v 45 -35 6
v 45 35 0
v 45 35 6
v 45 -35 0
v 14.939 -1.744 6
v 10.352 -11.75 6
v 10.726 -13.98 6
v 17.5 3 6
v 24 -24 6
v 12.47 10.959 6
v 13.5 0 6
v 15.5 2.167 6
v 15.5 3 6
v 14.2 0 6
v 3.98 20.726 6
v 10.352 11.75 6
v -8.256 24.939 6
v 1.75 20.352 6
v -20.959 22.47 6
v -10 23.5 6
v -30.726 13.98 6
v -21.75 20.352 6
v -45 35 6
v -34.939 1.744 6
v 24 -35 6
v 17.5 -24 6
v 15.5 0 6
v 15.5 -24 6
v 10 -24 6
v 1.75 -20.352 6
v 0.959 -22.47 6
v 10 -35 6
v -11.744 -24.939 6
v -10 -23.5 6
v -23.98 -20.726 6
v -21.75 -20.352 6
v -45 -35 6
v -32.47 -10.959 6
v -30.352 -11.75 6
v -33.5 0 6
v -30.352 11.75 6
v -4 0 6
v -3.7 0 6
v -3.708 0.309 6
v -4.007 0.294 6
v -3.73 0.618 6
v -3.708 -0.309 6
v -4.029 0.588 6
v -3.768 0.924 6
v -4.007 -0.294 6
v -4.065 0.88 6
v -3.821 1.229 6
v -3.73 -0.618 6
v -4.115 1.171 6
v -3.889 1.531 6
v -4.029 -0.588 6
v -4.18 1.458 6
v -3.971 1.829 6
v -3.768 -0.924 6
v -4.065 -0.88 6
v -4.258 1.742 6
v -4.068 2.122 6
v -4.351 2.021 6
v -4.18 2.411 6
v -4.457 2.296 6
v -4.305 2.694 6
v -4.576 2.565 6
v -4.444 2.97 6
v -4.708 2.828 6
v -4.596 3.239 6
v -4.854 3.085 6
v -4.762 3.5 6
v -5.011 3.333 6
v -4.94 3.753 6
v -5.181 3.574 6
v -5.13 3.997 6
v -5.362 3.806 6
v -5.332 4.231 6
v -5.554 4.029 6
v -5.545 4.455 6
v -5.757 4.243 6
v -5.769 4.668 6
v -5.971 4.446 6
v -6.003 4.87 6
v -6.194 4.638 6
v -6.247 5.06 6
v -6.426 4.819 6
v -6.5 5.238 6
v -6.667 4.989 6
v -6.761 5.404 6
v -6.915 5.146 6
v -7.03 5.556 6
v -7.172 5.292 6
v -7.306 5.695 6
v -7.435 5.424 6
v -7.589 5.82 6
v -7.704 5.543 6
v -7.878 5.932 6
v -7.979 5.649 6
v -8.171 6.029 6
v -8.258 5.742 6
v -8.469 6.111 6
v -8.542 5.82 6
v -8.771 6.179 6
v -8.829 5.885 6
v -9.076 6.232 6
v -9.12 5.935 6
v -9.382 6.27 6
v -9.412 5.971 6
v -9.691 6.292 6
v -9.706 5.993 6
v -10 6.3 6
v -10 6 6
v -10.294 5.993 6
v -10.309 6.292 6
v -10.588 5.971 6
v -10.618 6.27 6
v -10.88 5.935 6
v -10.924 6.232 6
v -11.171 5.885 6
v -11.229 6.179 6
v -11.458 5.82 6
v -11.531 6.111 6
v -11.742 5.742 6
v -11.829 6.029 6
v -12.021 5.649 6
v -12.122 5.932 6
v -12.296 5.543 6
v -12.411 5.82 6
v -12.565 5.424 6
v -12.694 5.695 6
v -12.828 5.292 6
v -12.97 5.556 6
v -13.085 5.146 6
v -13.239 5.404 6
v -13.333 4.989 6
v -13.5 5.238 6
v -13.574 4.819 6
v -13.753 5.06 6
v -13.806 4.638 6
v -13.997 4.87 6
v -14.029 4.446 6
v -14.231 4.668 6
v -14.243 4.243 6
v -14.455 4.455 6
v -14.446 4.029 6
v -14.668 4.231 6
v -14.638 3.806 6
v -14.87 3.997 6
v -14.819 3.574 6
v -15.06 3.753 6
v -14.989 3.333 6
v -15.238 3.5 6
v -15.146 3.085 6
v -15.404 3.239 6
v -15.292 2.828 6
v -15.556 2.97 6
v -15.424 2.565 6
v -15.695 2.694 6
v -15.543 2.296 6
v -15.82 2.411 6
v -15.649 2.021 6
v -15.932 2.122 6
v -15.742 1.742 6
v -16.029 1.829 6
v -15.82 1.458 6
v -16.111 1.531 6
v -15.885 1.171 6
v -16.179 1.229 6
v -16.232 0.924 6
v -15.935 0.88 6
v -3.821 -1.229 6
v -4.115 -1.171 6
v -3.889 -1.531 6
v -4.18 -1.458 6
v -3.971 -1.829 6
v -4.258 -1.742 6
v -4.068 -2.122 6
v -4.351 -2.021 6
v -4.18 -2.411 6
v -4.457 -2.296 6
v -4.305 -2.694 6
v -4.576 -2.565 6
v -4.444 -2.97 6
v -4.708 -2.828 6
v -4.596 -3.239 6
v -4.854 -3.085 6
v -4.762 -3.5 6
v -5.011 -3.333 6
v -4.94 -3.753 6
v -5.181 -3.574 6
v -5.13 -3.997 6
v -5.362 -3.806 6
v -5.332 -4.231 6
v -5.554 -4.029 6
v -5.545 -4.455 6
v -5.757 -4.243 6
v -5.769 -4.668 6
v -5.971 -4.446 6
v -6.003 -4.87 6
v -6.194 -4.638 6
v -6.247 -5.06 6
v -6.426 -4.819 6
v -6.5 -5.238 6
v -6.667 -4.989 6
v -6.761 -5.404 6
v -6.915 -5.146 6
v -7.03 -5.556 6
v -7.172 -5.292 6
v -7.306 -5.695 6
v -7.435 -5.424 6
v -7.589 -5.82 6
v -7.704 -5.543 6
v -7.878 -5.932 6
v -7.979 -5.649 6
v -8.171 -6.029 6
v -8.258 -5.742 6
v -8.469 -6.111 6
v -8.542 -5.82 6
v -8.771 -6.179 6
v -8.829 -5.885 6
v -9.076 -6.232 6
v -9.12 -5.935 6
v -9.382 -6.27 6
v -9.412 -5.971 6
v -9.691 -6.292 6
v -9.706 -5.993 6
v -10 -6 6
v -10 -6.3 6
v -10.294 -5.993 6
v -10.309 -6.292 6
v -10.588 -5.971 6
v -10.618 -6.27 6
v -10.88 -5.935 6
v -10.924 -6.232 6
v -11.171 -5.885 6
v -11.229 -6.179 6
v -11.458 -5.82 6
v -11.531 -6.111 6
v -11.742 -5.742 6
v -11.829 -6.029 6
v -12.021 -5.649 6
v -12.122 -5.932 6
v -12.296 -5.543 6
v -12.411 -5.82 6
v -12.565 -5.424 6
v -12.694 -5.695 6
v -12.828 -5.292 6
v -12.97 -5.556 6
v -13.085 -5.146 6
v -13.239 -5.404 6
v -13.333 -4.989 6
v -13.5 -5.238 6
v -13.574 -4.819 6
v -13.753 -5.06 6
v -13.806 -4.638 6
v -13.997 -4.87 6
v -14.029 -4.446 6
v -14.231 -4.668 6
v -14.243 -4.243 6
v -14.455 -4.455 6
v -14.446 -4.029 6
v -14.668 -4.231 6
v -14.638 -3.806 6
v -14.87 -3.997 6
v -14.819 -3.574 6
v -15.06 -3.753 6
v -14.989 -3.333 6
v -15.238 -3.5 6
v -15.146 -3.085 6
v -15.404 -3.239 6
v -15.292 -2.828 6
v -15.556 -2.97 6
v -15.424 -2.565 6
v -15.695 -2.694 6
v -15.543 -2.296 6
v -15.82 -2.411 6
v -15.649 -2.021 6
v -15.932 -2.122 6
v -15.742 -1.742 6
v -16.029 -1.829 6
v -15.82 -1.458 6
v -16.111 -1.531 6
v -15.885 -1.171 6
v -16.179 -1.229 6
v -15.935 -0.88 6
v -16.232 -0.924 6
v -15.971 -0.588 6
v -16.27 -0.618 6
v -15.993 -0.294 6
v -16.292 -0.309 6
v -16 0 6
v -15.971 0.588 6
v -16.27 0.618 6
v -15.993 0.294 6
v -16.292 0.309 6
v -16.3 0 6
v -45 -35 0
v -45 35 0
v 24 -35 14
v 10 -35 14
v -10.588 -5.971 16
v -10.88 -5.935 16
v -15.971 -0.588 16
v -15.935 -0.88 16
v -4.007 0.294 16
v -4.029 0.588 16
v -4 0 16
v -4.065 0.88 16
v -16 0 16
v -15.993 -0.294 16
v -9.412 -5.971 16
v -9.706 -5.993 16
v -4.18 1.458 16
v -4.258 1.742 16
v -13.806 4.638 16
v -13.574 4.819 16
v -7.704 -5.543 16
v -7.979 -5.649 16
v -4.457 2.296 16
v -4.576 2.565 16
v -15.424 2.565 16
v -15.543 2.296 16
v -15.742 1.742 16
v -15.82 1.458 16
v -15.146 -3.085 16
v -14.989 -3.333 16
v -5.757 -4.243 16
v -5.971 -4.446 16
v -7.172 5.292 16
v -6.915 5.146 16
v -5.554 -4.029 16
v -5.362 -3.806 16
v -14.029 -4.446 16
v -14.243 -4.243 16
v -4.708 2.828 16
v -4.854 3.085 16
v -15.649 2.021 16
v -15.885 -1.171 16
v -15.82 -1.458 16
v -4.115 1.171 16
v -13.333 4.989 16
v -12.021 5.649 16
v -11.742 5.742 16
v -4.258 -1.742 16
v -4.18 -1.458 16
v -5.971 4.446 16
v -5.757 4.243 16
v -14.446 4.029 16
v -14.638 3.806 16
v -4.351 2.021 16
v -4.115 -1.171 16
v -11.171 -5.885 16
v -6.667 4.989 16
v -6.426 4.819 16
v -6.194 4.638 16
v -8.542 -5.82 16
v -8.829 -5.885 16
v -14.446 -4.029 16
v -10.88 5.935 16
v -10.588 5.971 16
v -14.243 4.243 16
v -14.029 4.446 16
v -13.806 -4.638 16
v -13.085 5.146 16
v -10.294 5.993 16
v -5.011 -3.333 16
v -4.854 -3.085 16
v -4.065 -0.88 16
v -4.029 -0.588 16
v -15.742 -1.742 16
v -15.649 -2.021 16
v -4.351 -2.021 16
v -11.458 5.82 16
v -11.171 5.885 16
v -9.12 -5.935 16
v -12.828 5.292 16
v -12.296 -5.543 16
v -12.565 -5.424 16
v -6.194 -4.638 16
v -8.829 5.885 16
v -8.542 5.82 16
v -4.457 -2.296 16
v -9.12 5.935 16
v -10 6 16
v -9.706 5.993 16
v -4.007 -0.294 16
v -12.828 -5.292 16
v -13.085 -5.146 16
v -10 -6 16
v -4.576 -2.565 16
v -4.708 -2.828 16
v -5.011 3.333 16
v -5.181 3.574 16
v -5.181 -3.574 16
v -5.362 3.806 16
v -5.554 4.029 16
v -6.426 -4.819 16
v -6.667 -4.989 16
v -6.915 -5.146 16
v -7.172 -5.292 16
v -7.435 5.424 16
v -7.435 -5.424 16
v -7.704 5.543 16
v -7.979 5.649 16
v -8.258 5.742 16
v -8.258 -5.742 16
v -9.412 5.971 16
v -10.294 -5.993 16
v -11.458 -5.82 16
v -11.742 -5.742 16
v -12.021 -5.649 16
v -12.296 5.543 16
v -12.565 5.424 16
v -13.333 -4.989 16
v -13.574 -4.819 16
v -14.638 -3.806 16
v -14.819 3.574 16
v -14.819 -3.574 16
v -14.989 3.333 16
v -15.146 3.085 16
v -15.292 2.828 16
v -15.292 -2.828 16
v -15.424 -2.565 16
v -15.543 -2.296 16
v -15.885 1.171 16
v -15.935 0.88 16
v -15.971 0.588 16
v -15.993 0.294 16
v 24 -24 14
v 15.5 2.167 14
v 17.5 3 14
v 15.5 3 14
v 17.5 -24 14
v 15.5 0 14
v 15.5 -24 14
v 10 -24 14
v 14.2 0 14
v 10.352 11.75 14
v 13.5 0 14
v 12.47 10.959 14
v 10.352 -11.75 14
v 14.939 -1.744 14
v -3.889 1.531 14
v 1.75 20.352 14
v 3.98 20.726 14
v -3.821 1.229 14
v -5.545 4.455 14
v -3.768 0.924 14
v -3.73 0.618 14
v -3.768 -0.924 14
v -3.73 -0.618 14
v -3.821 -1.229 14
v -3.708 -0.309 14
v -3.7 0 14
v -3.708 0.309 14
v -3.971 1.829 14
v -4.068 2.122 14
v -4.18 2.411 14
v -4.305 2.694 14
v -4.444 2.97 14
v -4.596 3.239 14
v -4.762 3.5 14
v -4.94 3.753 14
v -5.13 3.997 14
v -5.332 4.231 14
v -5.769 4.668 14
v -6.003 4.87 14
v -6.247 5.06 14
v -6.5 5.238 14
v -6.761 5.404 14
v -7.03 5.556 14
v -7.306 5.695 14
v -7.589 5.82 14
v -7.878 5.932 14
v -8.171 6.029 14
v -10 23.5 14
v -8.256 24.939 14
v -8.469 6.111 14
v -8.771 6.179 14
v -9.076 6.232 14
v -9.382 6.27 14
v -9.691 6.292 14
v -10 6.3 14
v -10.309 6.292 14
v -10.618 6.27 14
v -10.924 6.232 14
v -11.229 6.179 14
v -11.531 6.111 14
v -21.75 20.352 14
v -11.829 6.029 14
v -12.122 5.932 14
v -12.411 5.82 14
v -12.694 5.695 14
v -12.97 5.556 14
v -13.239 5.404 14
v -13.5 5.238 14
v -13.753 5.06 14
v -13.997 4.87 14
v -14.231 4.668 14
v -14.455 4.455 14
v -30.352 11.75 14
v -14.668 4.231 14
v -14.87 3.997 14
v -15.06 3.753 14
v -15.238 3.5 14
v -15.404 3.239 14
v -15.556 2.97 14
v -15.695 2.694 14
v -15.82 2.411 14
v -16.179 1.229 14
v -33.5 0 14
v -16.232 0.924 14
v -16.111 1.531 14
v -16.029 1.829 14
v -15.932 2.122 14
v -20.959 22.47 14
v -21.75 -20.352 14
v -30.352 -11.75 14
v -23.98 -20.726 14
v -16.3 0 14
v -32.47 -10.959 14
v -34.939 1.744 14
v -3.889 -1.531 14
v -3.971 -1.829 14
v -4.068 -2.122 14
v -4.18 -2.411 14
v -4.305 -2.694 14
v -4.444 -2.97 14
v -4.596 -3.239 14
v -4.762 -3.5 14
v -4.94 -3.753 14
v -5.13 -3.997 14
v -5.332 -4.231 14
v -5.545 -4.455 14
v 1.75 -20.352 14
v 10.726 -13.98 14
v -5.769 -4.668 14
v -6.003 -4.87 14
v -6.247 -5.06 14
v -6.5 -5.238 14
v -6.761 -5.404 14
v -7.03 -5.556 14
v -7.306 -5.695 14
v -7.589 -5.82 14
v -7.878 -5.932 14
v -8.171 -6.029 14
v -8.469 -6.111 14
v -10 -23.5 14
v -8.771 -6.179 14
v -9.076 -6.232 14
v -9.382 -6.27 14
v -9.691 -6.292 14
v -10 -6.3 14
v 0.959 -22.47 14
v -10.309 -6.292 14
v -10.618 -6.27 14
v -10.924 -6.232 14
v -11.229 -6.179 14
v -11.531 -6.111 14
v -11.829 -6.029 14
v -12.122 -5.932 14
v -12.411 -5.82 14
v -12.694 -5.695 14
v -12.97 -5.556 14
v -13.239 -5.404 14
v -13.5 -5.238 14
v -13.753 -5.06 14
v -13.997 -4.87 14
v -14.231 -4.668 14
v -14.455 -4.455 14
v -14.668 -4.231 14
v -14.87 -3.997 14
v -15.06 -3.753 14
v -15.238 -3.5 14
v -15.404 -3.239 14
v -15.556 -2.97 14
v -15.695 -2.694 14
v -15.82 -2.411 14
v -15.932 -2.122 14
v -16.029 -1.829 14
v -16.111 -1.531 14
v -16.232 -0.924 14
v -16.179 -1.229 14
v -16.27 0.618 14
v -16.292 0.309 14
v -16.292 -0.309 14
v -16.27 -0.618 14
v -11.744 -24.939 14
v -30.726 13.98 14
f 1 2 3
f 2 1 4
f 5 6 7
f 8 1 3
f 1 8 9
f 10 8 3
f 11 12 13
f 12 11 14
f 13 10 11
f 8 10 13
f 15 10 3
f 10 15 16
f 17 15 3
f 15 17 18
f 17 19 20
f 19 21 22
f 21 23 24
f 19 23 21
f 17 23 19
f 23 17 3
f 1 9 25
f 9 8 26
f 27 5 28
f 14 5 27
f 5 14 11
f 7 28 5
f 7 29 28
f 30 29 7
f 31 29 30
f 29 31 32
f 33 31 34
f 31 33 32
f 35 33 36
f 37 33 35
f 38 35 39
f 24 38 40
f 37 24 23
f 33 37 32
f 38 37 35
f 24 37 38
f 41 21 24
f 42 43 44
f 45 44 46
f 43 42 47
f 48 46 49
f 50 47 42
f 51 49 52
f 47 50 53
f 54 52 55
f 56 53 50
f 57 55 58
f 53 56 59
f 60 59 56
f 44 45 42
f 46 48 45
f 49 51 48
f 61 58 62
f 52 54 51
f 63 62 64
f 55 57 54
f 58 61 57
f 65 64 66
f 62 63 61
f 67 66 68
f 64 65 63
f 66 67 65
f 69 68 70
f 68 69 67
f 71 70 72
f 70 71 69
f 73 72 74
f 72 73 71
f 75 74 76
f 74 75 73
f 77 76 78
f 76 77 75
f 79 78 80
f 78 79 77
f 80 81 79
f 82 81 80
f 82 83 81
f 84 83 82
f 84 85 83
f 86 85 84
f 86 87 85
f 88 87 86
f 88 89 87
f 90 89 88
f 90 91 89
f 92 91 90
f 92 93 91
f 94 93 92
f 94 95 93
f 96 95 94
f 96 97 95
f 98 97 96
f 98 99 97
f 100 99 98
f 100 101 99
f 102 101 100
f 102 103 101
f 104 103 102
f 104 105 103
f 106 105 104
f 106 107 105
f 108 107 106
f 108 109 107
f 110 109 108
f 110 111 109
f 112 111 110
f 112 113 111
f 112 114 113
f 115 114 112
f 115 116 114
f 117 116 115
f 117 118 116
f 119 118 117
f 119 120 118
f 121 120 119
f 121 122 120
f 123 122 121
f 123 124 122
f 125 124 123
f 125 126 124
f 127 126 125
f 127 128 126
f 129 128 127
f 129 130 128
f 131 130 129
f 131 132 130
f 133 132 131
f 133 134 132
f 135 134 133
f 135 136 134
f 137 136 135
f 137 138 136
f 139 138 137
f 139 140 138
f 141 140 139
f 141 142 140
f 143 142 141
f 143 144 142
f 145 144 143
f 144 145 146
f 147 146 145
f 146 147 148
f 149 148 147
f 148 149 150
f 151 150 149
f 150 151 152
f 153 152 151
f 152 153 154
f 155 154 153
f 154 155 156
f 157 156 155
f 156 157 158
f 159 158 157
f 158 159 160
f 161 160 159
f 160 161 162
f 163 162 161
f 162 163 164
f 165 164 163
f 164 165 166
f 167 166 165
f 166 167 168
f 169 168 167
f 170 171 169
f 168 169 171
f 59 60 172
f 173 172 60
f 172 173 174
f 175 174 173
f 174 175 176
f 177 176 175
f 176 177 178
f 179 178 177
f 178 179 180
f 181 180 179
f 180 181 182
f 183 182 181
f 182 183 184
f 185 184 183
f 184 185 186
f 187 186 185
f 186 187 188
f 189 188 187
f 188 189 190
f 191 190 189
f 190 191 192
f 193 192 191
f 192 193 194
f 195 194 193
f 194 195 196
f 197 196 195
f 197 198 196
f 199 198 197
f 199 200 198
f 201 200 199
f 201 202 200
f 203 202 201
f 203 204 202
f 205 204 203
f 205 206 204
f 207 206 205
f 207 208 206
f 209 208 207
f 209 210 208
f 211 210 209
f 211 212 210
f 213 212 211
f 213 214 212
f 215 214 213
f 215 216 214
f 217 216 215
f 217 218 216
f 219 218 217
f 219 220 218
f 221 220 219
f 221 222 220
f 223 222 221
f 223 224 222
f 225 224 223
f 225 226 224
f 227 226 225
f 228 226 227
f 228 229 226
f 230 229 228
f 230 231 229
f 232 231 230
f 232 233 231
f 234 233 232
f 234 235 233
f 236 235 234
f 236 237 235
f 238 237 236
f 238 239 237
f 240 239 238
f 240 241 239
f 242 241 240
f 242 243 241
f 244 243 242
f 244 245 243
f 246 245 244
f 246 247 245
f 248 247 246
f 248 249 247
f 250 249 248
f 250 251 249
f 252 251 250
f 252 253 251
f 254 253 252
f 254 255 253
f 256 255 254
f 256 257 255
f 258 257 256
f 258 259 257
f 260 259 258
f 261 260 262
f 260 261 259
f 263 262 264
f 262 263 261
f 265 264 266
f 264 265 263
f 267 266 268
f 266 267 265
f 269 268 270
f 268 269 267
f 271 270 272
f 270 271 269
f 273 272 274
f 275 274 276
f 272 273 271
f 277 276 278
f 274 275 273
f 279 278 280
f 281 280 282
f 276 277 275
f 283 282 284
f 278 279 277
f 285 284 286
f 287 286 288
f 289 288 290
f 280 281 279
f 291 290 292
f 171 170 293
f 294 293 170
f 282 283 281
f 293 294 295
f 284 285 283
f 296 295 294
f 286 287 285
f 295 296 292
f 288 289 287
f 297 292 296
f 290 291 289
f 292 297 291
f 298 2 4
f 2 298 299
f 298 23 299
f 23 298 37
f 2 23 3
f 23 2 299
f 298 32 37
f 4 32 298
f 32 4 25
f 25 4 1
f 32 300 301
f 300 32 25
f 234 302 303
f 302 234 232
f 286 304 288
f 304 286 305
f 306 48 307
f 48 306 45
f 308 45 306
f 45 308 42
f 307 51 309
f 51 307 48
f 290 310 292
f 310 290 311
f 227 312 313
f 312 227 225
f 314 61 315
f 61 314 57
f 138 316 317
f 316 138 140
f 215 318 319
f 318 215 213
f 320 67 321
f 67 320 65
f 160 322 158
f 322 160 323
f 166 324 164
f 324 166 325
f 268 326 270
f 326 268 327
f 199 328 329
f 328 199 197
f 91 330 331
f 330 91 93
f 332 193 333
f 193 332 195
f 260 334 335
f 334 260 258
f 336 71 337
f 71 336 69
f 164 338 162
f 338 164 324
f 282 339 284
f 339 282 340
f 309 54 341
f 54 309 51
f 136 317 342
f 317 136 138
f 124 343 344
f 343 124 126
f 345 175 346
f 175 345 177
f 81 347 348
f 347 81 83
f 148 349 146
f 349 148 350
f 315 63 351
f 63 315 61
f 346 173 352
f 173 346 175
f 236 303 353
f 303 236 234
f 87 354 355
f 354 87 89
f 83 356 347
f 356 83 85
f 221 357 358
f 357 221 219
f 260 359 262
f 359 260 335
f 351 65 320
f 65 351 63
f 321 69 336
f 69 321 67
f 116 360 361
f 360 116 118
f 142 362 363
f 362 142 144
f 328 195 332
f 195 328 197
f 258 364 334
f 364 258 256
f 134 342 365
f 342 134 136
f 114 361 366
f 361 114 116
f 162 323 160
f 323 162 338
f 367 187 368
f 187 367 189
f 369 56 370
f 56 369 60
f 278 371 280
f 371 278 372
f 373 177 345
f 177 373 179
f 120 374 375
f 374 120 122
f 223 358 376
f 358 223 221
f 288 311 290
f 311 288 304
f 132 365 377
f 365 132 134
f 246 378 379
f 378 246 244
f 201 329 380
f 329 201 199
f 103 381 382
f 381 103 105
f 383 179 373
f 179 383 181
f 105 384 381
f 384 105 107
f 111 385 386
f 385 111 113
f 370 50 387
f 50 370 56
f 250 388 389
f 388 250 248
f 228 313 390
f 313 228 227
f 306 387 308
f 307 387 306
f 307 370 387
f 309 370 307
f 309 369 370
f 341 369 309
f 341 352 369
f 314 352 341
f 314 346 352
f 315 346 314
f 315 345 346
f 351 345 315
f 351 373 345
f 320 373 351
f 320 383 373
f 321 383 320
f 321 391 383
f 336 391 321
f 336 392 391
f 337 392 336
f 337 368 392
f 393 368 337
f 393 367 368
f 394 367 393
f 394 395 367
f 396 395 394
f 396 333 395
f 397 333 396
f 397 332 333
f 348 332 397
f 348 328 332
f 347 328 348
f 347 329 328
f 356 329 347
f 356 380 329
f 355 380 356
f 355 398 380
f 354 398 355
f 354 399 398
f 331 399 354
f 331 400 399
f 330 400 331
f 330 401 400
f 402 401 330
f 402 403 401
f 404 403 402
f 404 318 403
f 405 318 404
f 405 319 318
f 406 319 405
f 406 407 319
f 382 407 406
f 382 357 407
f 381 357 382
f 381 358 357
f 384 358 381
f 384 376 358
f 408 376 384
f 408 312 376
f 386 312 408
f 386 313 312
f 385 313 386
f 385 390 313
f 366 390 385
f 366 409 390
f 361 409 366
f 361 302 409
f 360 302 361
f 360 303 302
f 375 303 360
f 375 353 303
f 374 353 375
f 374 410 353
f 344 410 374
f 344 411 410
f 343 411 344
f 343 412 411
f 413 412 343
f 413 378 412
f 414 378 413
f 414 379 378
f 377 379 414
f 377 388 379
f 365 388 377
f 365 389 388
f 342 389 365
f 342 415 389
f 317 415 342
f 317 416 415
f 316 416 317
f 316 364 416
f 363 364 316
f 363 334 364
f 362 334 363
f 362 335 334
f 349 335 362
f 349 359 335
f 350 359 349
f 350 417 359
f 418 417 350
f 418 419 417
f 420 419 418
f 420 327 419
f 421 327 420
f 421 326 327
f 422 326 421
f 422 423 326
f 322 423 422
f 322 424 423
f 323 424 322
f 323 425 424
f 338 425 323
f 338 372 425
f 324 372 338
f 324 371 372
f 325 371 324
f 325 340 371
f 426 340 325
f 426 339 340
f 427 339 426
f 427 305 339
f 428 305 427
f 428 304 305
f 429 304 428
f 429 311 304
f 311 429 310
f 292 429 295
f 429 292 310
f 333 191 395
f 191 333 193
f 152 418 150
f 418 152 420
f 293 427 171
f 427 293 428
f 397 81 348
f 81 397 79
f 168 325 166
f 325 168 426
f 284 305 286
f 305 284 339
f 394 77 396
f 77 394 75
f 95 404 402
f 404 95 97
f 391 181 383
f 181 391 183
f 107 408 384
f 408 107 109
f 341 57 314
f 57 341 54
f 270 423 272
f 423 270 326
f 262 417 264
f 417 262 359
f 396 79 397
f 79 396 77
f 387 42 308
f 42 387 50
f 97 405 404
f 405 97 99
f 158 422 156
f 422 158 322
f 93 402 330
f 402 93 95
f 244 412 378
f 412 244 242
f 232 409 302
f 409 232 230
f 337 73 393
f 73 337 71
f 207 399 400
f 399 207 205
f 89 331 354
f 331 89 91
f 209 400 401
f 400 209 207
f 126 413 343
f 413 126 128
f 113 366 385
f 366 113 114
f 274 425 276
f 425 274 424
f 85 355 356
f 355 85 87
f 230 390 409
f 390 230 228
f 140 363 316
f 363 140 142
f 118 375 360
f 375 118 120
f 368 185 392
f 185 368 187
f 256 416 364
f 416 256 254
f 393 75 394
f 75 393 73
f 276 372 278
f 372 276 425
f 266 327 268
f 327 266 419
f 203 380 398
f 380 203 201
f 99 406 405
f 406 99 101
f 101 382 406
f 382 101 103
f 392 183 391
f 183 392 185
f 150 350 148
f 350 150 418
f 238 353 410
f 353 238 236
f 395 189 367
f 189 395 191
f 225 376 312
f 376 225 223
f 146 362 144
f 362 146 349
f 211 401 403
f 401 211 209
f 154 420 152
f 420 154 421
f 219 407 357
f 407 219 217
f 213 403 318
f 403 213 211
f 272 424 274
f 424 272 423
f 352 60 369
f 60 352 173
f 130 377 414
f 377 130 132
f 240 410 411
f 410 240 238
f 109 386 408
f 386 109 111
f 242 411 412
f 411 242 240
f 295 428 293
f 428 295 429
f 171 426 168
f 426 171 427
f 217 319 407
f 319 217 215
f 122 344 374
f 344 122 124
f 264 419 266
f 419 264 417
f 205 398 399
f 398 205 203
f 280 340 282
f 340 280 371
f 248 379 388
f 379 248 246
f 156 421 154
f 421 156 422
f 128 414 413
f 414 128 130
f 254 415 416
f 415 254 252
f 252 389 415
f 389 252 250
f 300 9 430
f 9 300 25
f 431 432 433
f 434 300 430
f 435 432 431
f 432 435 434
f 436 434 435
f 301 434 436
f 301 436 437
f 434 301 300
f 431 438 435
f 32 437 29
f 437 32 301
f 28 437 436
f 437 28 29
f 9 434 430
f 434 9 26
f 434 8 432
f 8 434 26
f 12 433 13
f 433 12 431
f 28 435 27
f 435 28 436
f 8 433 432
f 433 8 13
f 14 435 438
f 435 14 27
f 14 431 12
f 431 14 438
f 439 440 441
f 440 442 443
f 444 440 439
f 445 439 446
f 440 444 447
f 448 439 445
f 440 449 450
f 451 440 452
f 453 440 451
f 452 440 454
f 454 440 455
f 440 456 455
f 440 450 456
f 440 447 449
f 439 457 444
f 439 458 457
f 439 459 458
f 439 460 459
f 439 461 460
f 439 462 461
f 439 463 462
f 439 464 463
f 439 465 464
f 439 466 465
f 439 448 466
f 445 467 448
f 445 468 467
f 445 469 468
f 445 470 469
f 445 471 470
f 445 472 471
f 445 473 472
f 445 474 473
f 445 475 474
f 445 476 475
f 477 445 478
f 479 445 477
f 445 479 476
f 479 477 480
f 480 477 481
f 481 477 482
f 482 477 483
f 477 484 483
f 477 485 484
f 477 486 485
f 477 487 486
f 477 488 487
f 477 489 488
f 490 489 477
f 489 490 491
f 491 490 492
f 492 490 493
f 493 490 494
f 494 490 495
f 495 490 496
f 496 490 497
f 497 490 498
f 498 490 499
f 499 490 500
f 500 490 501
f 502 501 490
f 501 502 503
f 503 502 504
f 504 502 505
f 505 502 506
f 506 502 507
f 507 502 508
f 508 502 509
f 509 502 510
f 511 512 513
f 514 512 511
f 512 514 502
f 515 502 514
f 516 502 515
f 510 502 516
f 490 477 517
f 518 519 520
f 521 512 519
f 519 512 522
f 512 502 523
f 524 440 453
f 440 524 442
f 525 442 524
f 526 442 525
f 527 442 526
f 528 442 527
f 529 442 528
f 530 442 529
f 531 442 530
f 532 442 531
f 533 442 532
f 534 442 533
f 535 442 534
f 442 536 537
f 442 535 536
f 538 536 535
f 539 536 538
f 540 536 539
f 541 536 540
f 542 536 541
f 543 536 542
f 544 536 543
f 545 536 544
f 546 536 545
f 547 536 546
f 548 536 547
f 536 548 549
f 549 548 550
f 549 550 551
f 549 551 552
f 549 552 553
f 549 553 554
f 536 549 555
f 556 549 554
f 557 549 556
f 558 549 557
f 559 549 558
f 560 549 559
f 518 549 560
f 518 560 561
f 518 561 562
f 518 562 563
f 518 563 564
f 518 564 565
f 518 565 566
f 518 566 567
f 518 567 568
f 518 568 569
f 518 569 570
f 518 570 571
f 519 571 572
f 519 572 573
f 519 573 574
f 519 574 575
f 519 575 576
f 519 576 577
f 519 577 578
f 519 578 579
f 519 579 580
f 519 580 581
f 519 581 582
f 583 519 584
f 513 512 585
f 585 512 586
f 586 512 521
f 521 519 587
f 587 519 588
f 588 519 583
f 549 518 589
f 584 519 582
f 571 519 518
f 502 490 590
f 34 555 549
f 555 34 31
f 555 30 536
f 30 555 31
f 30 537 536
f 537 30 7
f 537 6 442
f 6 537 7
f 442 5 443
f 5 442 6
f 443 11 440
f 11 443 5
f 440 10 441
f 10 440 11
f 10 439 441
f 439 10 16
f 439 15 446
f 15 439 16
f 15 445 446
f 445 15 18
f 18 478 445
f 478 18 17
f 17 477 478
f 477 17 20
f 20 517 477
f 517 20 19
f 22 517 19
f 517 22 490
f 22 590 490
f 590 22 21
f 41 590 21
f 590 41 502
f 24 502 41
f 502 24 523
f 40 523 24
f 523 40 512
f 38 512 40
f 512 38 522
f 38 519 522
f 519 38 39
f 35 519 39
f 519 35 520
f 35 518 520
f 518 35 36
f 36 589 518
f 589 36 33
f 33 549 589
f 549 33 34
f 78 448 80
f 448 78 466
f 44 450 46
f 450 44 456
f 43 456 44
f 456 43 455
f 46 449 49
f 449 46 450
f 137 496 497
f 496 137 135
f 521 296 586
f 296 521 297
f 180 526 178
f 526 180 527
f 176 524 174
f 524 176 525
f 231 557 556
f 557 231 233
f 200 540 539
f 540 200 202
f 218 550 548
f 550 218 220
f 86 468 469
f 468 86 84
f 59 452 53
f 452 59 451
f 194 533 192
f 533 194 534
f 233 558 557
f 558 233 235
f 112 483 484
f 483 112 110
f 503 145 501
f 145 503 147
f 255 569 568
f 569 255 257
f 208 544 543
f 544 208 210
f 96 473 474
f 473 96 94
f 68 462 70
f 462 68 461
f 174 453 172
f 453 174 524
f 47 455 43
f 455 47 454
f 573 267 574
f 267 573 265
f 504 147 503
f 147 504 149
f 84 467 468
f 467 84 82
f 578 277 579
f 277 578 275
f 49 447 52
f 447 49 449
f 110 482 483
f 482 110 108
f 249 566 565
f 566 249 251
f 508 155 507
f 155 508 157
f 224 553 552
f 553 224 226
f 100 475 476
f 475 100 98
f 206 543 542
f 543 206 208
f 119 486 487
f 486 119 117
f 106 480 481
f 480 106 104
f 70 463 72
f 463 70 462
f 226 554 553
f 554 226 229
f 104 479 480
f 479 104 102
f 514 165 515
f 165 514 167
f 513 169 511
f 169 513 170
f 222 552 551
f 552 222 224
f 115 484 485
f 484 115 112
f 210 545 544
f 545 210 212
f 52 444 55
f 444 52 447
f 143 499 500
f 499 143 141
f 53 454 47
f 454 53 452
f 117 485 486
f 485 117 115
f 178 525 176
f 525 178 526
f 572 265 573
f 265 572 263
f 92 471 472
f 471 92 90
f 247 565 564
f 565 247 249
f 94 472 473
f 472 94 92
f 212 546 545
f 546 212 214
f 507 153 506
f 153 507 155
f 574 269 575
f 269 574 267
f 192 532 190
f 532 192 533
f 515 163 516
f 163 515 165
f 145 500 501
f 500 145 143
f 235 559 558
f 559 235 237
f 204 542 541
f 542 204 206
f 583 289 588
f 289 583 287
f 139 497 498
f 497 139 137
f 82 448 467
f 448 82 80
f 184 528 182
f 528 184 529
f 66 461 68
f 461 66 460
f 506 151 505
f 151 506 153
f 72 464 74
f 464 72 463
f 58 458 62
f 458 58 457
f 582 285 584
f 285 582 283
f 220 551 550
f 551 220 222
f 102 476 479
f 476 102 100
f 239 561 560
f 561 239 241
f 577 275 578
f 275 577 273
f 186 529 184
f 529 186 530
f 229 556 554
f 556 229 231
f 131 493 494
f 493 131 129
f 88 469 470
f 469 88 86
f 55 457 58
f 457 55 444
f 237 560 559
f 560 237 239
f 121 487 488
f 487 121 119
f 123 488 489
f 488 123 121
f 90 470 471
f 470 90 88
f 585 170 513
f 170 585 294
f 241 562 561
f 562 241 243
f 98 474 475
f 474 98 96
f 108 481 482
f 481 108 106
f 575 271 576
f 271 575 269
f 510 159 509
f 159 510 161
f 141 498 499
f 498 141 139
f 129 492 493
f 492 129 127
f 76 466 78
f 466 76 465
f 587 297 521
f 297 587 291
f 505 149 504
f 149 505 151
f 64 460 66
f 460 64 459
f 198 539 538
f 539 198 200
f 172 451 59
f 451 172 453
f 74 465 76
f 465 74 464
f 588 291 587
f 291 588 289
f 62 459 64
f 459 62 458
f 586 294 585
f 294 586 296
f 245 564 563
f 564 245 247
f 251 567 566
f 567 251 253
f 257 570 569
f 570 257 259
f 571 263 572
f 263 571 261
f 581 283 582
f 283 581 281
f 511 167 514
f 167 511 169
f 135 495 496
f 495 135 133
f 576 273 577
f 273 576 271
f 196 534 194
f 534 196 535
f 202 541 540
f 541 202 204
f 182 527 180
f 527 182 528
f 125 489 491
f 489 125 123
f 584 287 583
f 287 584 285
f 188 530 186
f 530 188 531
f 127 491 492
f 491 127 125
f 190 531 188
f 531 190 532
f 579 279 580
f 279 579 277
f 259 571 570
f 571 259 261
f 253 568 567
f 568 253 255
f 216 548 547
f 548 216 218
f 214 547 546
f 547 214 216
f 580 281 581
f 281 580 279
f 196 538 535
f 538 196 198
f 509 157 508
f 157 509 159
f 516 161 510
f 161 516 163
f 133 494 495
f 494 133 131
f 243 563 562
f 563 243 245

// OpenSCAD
/* Ratchet wheel with spring pawl - PLA, 0.4 nozzle, no supports */
// Wheel ~50mm dia, 12 teeth. Free clockwise (from above), locks CCW.
// Print orientation: both parts flat, +Z up, bottom on bed.

/* [Part] */
part = "assembly"; // [wheel, base, assembly]
cadverify_only = "";
module instance(name, part, unit = 1) {
    echo(cadverify_instance = [name, part, unit]);
    if (cadverify_only == "" || cadverify_only == name) children();
}

// ---- parameters (mm) ----
Ro = 25;            // wheel tip radius (dia 50)
Rr = 23.5;          // wheel root radius (tooth height 1.5)
Nteeth = 12;
pitch = 360/Nteeth; // 30
gentle_span = 26;   // valley->tip CCW (gentle ramp)
wheel_t = 8;        // wheel thickness
bore_d = 12.6;      // wheel bore
post_d = 12;        // post diameter
post_h = 10;        // post height above base top
base_x = 90;
base_y = 70;
base_t = 6;
wheel_cx = -10;     // post/wheel centre in base coords
wheel_cy = 0;
base_top = base_t;  // 6
// pawl / arm
beam_x0 = 15.5; beam_x1 = 17.5;   // beam 2mm thick in X
beam_y0 = -30; beam_y1 = 3;       // beam length
beam_z0 = 6; beam_z1 = 14;        // beam height 8
tip_x = 14.2;       // pawl tip westmost (0.8 inside tip circle: 15-14.2=0.8)

$fn = 128;

// ---- wheel: centred at (0,0), bottom z=0 ----
module wheel() {
    difference() {
        linear_extrude(height = wheel_t, convexity = 4)
            polygon(points = [ for (i = [0:Nteeth-1]) each [
                [Rr*cos(i*pitch), Rr*sin(i*pitch)],
                [Ro*cos(i*pitch+gentle_span), Ro*sin(i*pitch+gentle_span)]
            ]]);
        translate([0,0,-1]) cylinder(d = bore_d, h = wheel_t+2);
    }
}

// ---- base: plate centred at origin, bottom z=0, post at (wheel_cx,wheel_cy) ----
module base() {
    union() {
        // plate
        translate([-base_x/2, -base_y/2, 0]) cube([base_x, base_y, base_t]);
        // post
        translate([wheel_cx, wheel_cy, base_top]) cylinder(d = post_d, h = post_h);
        // anchor block
        translate([10, -35, 6]) cube([14, 11, 8]);
        // flexible beam (2mm thick, ~33mm long, 8mm tall)
        translate([beam_x0, beam_y0, beam_z0]) cube([beam_x1-beam_x0, beam_y1-beam_y0, beam_z1-beam_z0]);
        // pawl tip wedge: tip (tip_x,0), overlap 0.5 into beam; north ramp, south flat
        linear_extrude(height = 8, convexity = 2)
            polygon(points = [[tip_x,0],[16,0],[16,3]]);
        // shift pawl wedge up to beam height (extrude from 0 -> translate)
    }
}

// pawl wedge is extruded 0..8, need to lift to 6..14: wrap
module base_fixed() {
    union() {
        translate([-base_x/2, -base_y/2, 0]) cube([base_x, base_y, base_t]);
        translate([wheel_cx, wheel_cy, base_top]) cylinder(d = post_d, h = post_h);
        translate([10, -35, 6]) cube([14, 11, 8]);
        translate([beam_x0, beam_y0, beam_z0]) cube([beam_x1-beam_x0, beam_y1-beam_y0, beam_z1-beam_z0]);
        translate([0,0,6]) linear_extrude(height = 8, convexity = 2)
            polygon(points = [[tip_x,0],[16,0],[16,3]]);
    }
}

// ---- specs ----
if (part == "wheel") echo(cadverify_spec = [
    ["bounds", [[-Ro, -Ro, 0], [Ro, Ro, wheel_t]]],
    ["bodies", 1],
    ["through_holes", 1],
    ["support_faces", [["bed", "-z", 1000]]],
    ["overhangs_allowed", []],
    ["copies", 1],
    ["details", [
        ["bore", "hole", [0, 0, 10], [0, 0, -1], [[0, bore_d], [wheel_t, bore_d]]],
        ["rim", "thickness", [0, 15, 10], [0, 0, -1], wheel_t],
        ["tooth", "material", [[11, -1, 0], [14, 2, wheel_t]], 0.5],
        ["teeth", "view", [[20, -25, 0], [Ro, 25, wheel_t]]]
    ]]
]);

if (part == "base") echo(cadverify_spec = [
    ["bounds", [[-base_x/2, -base_y/2, 0], [base_x/2, base_y/2, base_top+post_h]]],
    ["bodies", 1],
    ["support_faces", [["bed", "-z", 4000]]],
    ["overhangs_allowed", []],
    ["copies", 1],
    ["details", [
        ["plate", "thickness", [-30, 20, 10], [0, 0, -1], base_t],
        ["post", "material", [[wheel_cx-6, wheel_cy-6, base_top], [wheel_cx+6, wheel_cy+6, base_top+post_h]], 0.5],
        ["arm", "material", [[beam_x0, beam_y0, beam_z0], [beam_x1, beam_y1, beam_z1]], 0.9],
        ["pawl_tip", "view", [[14.0, -1, 6], [16, 3.5, 14]]]
    ]]
]);

if (part == "assembly") echo(cadverify_spec = [
    ["bounds", [[-base_x/2, -base_y/2, 0], [base_x/2, base_y/2, base_top+post_h]]],
    ["motions", [
        ["click", ["wheel1"], "rotate", [wheel_cx, wheel_cy, base_top], [0, 0, 1], [0, -360],
            ["flex", [["wheel1", "base1", 1.0, "pawl flexes over teeth"]]]]
    ]],
    ["assembly_order", [
        [["base1"], [0, 0, 0]],
        [["wheel1"], [0, 0, -30]]
    ]]
]);

// ---- geometry dispatch ----
if (part == "wheel") wheel();
else if (part == "base") base_fixed();
else if (part == "assembly") {
    instance("base1", "base") base_fixed();
    instance("wheel1", "wheel") translate([wheel_cx, wheel_cy, base_top]) wheel();
}
